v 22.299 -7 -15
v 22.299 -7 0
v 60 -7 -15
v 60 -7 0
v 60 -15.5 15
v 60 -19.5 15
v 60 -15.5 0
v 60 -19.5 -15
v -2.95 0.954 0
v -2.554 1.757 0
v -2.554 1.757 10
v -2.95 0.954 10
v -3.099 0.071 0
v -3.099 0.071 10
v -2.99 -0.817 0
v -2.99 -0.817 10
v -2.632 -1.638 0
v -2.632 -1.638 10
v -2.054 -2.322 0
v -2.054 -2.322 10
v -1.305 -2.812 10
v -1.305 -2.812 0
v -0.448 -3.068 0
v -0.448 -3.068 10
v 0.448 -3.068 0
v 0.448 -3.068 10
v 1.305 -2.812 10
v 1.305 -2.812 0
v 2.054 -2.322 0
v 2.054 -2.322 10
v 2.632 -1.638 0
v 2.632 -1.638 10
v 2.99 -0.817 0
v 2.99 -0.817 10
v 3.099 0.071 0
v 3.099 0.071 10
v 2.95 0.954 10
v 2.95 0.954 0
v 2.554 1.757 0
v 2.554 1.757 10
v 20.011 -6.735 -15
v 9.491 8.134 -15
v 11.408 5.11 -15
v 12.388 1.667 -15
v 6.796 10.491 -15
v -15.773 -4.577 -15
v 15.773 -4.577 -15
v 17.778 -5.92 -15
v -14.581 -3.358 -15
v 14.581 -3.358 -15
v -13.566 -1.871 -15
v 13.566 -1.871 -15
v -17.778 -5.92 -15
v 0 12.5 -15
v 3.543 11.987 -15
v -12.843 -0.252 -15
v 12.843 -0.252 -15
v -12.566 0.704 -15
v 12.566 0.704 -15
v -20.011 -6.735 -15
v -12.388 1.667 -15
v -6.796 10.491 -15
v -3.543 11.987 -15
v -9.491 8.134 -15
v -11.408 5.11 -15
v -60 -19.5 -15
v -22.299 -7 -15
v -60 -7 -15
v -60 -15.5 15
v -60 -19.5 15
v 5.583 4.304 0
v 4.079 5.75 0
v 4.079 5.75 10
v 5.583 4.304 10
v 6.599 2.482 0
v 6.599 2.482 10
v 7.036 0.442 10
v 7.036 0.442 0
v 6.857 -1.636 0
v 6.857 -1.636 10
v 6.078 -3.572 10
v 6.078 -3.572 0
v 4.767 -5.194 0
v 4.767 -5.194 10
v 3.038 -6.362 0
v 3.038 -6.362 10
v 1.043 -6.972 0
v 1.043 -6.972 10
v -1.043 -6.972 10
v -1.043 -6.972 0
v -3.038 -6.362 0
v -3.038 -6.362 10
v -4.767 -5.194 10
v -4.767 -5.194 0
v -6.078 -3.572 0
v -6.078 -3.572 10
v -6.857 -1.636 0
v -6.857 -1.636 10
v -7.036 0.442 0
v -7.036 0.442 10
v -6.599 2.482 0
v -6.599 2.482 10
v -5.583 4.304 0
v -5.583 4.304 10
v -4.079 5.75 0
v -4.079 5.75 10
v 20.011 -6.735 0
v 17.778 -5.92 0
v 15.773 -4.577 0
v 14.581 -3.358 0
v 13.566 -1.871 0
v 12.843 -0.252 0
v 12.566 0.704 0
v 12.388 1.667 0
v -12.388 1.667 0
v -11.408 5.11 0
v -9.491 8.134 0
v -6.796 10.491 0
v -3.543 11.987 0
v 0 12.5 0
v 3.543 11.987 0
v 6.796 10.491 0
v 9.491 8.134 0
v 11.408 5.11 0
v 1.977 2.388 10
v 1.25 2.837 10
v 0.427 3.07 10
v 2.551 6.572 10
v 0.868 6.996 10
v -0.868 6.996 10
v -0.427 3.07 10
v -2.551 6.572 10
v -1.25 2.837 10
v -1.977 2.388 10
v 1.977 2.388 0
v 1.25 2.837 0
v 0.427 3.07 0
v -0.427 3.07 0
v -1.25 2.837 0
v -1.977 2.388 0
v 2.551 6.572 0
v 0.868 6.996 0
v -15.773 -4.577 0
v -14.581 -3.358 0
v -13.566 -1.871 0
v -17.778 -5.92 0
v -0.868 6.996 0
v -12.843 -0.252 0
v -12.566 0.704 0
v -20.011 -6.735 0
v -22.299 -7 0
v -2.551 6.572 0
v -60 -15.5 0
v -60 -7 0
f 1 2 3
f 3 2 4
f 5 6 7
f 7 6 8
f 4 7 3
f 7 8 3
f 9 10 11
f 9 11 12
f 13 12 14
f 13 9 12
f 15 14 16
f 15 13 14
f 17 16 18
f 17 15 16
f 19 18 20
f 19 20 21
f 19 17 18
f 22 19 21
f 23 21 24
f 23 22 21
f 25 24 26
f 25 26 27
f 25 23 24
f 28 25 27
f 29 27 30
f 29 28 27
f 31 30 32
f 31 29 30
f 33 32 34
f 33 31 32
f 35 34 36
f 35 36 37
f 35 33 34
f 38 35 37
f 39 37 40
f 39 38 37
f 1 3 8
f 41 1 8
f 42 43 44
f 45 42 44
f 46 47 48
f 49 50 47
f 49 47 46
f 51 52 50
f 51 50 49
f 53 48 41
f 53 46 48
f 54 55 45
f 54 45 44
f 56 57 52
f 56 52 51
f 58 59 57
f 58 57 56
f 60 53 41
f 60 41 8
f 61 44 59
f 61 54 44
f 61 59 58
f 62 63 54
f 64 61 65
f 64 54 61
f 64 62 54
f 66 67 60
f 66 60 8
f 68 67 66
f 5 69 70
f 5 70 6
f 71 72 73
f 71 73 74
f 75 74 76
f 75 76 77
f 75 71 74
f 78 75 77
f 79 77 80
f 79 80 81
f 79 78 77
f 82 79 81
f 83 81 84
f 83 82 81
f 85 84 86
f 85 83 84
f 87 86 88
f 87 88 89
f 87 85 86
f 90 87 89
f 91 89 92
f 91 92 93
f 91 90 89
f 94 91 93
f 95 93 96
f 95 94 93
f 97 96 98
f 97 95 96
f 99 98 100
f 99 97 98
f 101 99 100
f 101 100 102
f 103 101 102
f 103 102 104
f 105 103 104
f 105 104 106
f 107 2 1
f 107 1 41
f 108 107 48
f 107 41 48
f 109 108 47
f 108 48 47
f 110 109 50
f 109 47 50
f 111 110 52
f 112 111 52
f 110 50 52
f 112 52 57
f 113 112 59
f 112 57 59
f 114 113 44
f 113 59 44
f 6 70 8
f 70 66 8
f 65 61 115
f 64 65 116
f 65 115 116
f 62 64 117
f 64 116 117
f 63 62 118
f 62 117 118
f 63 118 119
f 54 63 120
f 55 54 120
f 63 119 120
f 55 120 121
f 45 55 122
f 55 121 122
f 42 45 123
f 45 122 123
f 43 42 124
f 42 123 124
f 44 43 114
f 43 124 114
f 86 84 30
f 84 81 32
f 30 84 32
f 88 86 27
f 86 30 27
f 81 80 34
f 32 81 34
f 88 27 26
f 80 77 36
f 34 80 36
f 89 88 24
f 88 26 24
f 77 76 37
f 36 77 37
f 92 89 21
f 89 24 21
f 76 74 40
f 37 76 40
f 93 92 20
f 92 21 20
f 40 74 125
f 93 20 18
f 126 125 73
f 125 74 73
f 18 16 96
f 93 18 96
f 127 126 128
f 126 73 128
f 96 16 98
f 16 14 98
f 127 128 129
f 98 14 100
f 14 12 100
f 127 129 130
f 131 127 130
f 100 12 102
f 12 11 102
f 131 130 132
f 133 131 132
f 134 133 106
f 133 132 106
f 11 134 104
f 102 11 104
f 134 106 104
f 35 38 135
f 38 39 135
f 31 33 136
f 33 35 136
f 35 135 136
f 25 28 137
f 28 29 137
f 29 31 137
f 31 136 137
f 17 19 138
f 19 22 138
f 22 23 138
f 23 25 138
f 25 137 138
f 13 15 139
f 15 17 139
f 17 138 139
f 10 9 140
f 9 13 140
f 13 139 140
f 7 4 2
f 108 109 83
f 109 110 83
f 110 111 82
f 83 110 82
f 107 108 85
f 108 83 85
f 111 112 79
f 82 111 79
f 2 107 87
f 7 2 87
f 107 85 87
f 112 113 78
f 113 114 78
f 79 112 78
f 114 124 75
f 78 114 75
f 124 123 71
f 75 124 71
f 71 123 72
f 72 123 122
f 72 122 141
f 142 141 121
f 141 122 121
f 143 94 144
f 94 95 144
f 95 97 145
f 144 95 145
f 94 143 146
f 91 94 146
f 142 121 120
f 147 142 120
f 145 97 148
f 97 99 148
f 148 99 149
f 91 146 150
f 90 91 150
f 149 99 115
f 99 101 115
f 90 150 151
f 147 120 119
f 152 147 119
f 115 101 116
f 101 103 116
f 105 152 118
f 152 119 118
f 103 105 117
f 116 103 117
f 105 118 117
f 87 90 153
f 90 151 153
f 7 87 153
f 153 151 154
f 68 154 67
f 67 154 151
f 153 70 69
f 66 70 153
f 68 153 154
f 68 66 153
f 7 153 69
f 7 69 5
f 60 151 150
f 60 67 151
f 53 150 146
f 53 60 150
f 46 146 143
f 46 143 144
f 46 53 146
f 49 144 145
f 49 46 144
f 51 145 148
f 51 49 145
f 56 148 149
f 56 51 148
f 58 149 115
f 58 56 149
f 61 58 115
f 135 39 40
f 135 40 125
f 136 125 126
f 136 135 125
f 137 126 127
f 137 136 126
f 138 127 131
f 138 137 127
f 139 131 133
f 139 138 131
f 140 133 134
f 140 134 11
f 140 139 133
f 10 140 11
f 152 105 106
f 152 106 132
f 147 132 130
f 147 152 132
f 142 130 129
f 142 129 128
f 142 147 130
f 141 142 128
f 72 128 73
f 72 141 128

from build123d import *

# Parameters (mm, degrees)
BOSS_EXTRUDE1_DEPTH = 10
BOSS_EXTRUDE2_DEPTH = 15
FILLET1_R           = 10
SKETCH3_W           = 120
SKETCH3_H           = 4
BOSS_EXTRUDE3_DEPTH = 15


with BuildPart() as part:
    # Sketch1 → Boss-Extrude1 (new body)
    with BuildSketch(Plane.XY):
        with BuildLine():
            ThreePointArc((-4.079215611, 5.75), (0, 7.05), (4.079215611, 5.75))
            Line((4.079215611, 5.75), (-4.079215611, 5.75))
        make_face()
        with BuildLine():
            Line((-4.079215611, 5.75), (4.079215611, 5.75))
            ThreePointArc((4.079215611, 5.75), (0, -7.05), (-4.079215611, 5.75))
        make_face()
        with BuildLine():
            ThreePointArc((-2.554236133, 1.756666667), (0, -3.1), (2.554236133, 1.756666667))
            ThreePointArc((2.554236133, 1.756666667), (0, 3.1), (-2.554236133, 1.756666667))
        make_face(mode=Mode.SUBTRACT)
    extrude(amount=BOSS_EXTRUDE1_DEPTH)

    # Sketch2 → Boss-Extrude2 (add)
    with BuildSketch(Plane(origin=(0, 0, 0), x_dir=(-1, 0, 0), z_dir=(0, 0, -1))):
        with BuildLine():
            Line((-60, -19.5), (60, -19.5))
            Line((60, -19.5), (60, -7))
            Line((60, -7), (12.5, -7))
            Line((12.5, -7), (12.5, 0))
            ThreePointArc((12.5, 0), (0, 12.5), (-12.5, 0))
            Line((-12.5, 0), (-12.5, -7))
            Line((-12.5, -7), (-60, -7))
            Line((-60, -7), (-60, -19.5))
        make_face()
    extrude(amount=BOSS_EXTRUDE2_DEPTH)

    # Fillet1
    fillet1_edges = [part.edges().sort_by_distance(p)[0] for p in [
        (-12.5, -7, -7.5),
        (12.5, -7, -7.5),
    ]]
    fillet(fillet1_edges, radius=FILLET1_R)

    # Sketch3 → Boss-Extrude3 (add)
    with BuildSketch(Plane.XY):
        with Locations((0, -17.5)):
            Rectangle(SKETCH3_W, SKETCH3_H)
    extrude(amount=BOSS_EXTRUDE3_DEPTH)


solid = part.part
